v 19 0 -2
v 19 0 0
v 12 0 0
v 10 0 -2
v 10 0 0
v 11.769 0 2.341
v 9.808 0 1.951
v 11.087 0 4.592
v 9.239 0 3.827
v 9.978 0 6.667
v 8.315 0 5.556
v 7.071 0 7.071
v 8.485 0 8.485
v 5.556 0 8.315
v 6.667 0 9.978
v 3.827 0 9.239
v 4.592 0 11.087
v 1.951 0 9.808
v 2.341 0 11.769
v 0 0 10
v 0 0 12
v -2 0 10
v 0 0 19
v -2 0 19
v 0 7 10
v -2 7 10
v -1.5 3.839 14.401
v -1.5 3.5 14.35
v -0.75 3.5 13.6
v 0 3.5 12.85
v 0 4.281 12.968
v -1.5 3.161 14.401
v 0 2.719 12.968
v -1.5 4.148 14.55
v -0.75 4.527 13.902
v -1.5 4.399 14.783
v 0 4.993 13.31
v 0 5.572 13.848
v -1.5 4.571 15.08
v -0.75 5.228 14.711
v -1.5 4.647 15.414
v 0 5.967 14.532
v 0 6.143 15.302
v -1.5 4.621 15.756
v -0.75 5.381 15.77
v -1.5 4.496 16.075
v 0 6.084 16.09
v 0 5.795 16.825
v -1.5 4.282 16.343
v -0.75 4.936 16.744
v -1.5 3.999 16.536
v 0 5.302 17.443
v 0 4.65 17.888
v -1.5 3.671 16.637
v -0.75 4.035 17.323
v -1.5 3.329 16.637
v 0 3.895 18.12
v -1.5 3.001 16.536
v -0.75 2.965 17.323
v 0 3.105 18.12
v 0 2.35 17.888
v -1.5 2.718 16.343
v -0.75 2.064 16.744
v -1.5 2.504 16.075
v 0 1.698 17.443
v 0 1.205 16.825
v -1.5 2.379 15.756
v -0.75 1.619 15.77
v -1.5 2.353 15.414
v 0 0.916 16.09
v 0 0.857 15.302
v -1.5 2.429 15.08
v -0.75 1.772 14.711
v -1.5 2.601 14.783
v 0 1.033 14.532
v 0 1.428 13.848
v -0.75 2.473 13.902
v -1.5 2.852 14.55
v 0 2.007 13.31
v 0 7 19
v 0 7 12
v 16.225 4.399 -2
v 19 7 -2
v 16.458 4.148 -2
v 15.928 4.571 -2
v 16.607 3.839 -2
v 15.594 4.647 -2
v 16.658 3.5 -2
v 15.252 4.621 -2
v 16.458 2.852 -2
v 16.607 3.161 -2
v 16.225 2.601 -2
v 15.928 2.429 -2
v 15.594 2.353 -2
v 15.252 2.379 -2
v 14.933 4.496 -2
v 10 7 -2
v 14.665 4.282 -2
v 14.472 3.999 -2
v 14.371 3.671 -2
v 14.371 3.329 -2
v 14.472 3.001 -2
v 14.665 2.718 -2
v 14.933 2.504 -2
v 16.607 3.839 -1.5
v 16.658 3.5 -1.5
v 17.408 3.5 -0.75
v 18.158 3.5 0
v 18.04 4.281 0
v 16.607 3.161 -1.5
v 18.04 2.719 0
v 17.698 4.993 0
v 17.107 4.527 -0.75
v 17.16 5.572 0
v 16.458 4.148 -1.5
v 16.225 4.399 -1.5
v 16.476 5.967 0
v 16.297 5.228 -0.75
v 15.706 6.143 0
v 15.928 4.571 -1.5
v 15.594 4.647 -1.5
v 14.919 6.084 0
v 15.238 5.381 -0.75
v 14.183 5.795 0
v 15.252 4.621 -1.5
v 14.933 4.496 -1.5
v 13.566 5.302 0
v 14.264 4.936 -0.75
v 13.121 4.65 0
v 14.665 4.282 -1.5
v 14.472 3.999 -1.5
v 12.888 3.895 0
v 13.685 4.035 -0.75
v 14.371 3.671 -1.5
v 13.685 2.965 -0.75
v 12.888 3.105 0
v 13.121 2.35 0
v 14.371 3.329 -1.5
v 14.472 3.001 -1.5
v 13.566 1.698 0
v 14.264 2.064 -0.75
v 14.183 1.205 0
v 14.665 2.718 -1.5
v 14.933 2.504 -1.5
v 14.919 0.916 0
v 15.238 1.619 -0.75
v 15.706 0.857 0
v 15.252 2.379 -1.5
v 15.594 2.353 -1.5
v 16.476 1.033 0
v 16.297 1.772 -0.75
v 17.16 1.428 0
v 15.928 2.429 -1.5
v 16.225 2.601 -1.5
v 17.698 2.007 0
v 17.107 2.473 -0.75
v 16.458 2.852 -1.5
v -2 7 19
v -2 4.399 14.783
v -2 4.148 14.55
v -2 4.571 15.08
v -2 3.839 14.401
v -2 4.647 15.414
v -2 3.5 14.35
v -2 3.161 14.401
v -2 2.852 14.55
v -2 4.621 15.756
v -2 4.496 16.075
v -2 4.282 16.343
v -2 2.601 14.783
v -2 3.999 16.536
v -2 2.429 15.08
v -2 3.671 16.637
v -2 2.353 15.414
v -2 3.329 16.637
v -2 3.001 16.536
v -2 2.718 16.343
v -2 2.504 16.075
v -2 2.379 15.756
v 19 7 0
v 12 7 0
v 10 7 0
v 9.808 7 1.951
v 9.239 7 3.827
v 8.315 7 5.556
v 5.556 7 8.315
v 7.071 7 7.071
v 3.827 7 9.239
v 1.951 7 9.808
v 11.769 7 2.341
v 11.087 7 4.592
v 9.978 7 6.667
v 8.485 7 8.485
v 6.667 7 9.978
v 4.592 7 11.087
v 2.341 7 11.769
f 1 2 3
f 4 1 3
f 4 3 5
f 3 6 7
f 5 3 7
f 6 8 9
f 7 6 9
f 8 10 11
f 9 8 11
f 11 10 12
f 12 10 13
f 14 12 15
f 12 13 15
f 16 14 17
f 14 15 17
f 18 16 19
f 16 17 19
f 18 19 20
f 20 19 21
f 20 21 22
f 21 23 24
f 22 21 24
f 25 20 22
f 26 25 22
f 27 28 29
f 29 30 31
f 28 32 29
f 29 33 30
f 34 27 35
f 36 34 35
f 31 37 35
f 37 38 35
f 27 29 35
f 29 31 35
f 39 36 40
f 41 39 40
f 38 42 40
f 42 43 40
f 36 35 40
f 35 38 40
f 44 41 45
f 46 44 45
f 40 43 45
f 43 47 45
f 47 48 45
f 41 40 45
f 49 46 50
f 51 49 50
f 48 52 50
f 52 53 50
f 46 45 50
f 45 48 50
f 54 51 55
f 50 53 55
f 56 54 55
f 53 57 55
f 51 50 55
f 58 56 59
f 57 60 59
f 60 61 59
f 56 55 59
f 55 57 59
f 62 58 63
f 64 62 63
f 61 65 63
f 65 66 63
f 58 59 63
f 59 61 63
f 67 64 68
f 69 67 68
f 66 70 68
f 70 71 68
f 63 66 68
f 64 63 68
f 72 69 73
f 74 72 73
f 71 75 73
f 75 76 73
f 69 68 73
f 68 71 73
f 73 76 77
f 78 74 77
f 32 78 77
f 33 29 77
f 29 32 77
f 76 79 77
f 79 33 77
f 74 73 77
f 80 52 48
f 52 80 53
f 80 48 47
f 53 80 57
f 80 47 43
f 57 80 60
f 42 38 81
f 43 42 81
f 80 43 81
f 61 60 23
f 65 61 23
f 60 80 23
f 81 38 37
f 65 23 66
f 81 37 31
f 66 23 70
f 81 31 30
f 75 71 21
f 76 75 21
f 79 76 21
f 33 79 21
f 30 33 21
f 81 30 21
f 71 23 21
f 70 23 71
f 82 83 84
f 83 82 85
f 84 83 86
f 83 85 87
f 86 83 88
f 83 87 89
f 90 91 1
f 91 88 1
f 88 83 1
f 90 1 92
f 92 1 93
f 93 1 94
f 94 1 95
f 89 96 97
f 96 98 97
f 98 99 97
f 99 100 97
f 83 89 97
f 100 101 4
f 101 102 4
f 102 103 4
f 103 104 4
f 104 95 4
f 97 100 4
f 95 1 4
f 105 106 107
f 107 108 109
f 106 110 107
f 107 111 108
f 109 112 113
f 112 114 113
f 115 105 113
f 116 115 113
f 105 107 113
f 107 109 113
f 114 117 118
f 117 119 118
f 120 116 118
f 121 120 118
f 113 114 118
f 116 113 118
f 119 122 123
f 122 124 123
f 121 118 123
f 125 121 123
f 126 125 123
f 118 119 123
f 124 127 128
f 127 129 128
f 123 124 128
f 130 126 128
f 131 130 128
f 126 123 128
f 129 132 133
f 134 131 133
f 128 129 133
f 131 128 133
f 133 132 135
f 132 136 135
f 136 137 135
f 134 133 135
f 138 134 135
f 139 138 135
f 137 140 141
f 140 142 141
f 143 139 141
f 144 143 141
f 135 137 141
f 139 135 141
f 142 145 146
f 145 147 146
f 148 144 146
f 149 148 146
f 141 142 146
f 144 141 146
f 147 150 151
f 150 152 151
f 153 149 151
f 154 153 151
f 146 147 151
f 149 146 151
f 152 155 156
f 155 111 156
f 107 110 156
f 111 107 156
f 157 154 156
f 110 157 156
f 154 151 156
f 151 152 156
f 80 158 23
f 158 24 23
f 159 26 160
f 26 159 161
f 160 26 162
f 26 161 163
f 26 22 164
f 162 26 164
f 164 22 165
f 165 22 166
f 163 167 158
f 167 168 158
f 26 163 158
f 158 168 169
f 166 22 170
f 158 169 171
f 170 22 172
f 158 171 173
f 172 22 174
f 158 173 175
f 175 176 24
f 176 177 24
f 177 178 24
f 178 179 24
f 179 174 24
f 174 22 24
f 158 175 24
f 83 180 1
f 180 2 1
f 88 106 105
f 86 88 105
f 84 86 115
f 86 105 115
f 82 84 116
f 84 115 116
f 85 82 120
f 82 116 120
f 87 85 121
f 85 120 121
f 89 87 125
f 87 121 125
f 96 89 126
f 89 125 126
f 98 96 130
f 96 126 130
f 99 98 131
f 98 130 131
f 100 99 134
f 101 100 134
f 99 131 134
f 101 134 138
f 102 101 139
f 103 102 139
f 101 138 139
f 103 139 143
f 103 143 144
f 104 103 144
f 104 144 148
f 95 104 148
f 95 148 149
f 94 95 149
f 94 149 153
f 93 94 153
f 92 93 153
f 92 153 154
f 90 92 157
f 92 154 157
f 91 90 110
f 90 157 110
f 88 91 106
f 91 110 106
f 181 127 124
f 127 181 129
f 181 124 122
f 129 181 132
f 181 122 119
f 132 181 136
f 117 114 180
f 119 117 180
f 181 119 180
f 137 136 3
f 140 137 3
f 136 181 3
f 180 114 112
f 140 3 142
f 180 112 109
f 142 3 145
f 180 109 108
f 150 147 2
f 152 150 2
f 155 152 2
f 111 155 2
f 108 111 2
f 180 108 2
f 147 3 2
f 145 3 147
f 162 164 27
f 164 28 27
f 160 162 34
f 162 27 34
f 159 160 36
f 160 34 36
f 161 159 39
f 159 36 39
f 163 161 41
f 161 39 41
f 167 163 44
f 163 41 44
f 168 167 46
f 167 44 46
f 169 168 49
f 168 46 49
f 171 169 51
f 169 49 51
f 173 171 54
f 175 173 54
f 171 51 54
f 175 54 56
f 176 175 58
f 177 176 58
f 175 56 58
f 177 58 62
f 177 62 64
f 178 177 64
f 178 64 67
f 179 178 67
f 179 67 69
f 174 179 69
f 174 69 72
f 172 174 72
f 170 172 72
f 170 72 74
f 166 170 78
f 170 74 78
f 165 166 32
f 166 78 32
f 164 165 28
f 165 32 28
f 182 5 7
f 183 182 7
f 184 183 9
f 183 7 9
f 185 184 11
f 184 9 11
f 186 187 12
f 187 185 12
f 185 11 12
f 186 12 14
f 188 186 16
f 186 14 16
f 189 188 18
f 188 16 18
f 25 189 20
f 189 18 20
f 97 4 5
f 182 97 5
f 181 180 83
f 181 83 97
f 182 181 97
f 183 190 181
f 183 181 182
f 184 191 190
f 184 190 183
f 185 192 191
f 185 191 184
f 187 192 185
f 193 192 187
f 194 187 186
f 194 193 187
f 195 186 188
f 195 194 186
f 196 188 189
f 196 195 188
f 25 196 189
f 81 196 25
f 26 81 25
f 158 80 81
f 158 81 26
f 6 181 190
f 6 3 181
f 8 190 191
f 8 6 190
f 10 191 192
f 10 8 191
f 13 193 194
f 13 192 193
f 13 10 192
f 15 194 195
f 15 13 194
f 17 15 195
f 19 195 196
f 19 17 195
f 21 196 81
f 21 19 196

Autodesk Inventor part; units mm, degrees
ref_plane "YZ Plane" through (0, 0, 0) normal (1, 0, 0) x (0, 1, 0)
ref_plane "XZ Plane" through (0, 0, 0) normal (0, 1, 0) x (-1, 0, 0)
ref_plane "XY Plane" through (0, 0, 0) normal (0, 0, 1) x (1, 0, 0)
sketch "Sketch3" plane through (0, 0, 0) normal (0, 1, 0) x (-1, 0, 0)
  arc A0 (0, 10) -> (-10, 0) centre (0, 0) ccw
  arc A1 (0, 12) -> (-12, 0) centre (0, 0) ccw
  line L0 (0, 10) -> (2, 10)
  line L1 (2, 10) -> (2, 19)
  line L2 (2, 19) -> (0, 19)
  line L3 (0, 19) -> (0, 10)
  line L4 (-10, 0) -> (-19, 0)
  line L5 (-19, 0) -> (-19, -2)
  line L6 (-19, -2) -> (-10, -2)
  line L7 (-10, -2) -> (-10, 0)
  line L8 (0, 12) -> (0, 10)
  line L9 (-10, 0) -> (-12, 0)
  dimension "d10" = 10
  dimension "d11" = 12
  dimension "d12" = 2
  dimension "d13" = 9
  dimension "d14" = 9
  dimension "d15" = 2
extrude "Extrusion2" add sketch "Sketch3" along normal blind 7
sketch "Sketch4" plane through (0, 0, 19) normal (1, 0, 0) x (0, 0, -1)
  line L0 (0, 0) -> (0, 7) projected
  line L1 (0, 3.5) -> (7, 3.5) construction
  line L2 (7, 0) -> (7, 7) projected
  line L3 (7, 0) -> (7, 7) construction
  line L4 (0, 7) -> (7, 7) construction
  line L5 (0, 0) -> (0, 7) construction
  line L6 (0, 0) -> (7, 0) construction
  line L7 (9, 7) -> (0, 7) construction
  line L8 (3.5, 7) -> (3.5, 3.5) construction
  circle A0 centre (3.5, 3.5) radius 1.15
  point P0 (19, 0)
  dimension "d18" = 2.3
extrude "Extrusion3" cut sketch "Sketch4" against normal blind 2
chamfer "Chamfer1" distance 1.5 angle 45 1 edges at (0, 3.5, 16.65)
sketch "Sketch6" plane through (12, 0, 0) normal (0, 0, 1) x (1, 0, 0)
  line L0 (7, 0) -> (7, 7) projected
  line L1 (7, 3.5) -> (0.0163, 3.5) construction
  line L2 (0, 7) -> (7, 7) projected
  line L3 (3.5, 7) -> (3.5082, 3.5) construction
  circle A0 centre (3.5082, 3.5) radius 1.15
  point P0 (-12, 0)
  dimension "d24" = 2.3
extrude "Extrusion4" cut sketch "Sketch6" against normal blind 2
chamfer "Chamfer2" distance 1.5 angle 45 1 edges at (14.3582, 3.5, 0)
properties part number "wiresHolder"
